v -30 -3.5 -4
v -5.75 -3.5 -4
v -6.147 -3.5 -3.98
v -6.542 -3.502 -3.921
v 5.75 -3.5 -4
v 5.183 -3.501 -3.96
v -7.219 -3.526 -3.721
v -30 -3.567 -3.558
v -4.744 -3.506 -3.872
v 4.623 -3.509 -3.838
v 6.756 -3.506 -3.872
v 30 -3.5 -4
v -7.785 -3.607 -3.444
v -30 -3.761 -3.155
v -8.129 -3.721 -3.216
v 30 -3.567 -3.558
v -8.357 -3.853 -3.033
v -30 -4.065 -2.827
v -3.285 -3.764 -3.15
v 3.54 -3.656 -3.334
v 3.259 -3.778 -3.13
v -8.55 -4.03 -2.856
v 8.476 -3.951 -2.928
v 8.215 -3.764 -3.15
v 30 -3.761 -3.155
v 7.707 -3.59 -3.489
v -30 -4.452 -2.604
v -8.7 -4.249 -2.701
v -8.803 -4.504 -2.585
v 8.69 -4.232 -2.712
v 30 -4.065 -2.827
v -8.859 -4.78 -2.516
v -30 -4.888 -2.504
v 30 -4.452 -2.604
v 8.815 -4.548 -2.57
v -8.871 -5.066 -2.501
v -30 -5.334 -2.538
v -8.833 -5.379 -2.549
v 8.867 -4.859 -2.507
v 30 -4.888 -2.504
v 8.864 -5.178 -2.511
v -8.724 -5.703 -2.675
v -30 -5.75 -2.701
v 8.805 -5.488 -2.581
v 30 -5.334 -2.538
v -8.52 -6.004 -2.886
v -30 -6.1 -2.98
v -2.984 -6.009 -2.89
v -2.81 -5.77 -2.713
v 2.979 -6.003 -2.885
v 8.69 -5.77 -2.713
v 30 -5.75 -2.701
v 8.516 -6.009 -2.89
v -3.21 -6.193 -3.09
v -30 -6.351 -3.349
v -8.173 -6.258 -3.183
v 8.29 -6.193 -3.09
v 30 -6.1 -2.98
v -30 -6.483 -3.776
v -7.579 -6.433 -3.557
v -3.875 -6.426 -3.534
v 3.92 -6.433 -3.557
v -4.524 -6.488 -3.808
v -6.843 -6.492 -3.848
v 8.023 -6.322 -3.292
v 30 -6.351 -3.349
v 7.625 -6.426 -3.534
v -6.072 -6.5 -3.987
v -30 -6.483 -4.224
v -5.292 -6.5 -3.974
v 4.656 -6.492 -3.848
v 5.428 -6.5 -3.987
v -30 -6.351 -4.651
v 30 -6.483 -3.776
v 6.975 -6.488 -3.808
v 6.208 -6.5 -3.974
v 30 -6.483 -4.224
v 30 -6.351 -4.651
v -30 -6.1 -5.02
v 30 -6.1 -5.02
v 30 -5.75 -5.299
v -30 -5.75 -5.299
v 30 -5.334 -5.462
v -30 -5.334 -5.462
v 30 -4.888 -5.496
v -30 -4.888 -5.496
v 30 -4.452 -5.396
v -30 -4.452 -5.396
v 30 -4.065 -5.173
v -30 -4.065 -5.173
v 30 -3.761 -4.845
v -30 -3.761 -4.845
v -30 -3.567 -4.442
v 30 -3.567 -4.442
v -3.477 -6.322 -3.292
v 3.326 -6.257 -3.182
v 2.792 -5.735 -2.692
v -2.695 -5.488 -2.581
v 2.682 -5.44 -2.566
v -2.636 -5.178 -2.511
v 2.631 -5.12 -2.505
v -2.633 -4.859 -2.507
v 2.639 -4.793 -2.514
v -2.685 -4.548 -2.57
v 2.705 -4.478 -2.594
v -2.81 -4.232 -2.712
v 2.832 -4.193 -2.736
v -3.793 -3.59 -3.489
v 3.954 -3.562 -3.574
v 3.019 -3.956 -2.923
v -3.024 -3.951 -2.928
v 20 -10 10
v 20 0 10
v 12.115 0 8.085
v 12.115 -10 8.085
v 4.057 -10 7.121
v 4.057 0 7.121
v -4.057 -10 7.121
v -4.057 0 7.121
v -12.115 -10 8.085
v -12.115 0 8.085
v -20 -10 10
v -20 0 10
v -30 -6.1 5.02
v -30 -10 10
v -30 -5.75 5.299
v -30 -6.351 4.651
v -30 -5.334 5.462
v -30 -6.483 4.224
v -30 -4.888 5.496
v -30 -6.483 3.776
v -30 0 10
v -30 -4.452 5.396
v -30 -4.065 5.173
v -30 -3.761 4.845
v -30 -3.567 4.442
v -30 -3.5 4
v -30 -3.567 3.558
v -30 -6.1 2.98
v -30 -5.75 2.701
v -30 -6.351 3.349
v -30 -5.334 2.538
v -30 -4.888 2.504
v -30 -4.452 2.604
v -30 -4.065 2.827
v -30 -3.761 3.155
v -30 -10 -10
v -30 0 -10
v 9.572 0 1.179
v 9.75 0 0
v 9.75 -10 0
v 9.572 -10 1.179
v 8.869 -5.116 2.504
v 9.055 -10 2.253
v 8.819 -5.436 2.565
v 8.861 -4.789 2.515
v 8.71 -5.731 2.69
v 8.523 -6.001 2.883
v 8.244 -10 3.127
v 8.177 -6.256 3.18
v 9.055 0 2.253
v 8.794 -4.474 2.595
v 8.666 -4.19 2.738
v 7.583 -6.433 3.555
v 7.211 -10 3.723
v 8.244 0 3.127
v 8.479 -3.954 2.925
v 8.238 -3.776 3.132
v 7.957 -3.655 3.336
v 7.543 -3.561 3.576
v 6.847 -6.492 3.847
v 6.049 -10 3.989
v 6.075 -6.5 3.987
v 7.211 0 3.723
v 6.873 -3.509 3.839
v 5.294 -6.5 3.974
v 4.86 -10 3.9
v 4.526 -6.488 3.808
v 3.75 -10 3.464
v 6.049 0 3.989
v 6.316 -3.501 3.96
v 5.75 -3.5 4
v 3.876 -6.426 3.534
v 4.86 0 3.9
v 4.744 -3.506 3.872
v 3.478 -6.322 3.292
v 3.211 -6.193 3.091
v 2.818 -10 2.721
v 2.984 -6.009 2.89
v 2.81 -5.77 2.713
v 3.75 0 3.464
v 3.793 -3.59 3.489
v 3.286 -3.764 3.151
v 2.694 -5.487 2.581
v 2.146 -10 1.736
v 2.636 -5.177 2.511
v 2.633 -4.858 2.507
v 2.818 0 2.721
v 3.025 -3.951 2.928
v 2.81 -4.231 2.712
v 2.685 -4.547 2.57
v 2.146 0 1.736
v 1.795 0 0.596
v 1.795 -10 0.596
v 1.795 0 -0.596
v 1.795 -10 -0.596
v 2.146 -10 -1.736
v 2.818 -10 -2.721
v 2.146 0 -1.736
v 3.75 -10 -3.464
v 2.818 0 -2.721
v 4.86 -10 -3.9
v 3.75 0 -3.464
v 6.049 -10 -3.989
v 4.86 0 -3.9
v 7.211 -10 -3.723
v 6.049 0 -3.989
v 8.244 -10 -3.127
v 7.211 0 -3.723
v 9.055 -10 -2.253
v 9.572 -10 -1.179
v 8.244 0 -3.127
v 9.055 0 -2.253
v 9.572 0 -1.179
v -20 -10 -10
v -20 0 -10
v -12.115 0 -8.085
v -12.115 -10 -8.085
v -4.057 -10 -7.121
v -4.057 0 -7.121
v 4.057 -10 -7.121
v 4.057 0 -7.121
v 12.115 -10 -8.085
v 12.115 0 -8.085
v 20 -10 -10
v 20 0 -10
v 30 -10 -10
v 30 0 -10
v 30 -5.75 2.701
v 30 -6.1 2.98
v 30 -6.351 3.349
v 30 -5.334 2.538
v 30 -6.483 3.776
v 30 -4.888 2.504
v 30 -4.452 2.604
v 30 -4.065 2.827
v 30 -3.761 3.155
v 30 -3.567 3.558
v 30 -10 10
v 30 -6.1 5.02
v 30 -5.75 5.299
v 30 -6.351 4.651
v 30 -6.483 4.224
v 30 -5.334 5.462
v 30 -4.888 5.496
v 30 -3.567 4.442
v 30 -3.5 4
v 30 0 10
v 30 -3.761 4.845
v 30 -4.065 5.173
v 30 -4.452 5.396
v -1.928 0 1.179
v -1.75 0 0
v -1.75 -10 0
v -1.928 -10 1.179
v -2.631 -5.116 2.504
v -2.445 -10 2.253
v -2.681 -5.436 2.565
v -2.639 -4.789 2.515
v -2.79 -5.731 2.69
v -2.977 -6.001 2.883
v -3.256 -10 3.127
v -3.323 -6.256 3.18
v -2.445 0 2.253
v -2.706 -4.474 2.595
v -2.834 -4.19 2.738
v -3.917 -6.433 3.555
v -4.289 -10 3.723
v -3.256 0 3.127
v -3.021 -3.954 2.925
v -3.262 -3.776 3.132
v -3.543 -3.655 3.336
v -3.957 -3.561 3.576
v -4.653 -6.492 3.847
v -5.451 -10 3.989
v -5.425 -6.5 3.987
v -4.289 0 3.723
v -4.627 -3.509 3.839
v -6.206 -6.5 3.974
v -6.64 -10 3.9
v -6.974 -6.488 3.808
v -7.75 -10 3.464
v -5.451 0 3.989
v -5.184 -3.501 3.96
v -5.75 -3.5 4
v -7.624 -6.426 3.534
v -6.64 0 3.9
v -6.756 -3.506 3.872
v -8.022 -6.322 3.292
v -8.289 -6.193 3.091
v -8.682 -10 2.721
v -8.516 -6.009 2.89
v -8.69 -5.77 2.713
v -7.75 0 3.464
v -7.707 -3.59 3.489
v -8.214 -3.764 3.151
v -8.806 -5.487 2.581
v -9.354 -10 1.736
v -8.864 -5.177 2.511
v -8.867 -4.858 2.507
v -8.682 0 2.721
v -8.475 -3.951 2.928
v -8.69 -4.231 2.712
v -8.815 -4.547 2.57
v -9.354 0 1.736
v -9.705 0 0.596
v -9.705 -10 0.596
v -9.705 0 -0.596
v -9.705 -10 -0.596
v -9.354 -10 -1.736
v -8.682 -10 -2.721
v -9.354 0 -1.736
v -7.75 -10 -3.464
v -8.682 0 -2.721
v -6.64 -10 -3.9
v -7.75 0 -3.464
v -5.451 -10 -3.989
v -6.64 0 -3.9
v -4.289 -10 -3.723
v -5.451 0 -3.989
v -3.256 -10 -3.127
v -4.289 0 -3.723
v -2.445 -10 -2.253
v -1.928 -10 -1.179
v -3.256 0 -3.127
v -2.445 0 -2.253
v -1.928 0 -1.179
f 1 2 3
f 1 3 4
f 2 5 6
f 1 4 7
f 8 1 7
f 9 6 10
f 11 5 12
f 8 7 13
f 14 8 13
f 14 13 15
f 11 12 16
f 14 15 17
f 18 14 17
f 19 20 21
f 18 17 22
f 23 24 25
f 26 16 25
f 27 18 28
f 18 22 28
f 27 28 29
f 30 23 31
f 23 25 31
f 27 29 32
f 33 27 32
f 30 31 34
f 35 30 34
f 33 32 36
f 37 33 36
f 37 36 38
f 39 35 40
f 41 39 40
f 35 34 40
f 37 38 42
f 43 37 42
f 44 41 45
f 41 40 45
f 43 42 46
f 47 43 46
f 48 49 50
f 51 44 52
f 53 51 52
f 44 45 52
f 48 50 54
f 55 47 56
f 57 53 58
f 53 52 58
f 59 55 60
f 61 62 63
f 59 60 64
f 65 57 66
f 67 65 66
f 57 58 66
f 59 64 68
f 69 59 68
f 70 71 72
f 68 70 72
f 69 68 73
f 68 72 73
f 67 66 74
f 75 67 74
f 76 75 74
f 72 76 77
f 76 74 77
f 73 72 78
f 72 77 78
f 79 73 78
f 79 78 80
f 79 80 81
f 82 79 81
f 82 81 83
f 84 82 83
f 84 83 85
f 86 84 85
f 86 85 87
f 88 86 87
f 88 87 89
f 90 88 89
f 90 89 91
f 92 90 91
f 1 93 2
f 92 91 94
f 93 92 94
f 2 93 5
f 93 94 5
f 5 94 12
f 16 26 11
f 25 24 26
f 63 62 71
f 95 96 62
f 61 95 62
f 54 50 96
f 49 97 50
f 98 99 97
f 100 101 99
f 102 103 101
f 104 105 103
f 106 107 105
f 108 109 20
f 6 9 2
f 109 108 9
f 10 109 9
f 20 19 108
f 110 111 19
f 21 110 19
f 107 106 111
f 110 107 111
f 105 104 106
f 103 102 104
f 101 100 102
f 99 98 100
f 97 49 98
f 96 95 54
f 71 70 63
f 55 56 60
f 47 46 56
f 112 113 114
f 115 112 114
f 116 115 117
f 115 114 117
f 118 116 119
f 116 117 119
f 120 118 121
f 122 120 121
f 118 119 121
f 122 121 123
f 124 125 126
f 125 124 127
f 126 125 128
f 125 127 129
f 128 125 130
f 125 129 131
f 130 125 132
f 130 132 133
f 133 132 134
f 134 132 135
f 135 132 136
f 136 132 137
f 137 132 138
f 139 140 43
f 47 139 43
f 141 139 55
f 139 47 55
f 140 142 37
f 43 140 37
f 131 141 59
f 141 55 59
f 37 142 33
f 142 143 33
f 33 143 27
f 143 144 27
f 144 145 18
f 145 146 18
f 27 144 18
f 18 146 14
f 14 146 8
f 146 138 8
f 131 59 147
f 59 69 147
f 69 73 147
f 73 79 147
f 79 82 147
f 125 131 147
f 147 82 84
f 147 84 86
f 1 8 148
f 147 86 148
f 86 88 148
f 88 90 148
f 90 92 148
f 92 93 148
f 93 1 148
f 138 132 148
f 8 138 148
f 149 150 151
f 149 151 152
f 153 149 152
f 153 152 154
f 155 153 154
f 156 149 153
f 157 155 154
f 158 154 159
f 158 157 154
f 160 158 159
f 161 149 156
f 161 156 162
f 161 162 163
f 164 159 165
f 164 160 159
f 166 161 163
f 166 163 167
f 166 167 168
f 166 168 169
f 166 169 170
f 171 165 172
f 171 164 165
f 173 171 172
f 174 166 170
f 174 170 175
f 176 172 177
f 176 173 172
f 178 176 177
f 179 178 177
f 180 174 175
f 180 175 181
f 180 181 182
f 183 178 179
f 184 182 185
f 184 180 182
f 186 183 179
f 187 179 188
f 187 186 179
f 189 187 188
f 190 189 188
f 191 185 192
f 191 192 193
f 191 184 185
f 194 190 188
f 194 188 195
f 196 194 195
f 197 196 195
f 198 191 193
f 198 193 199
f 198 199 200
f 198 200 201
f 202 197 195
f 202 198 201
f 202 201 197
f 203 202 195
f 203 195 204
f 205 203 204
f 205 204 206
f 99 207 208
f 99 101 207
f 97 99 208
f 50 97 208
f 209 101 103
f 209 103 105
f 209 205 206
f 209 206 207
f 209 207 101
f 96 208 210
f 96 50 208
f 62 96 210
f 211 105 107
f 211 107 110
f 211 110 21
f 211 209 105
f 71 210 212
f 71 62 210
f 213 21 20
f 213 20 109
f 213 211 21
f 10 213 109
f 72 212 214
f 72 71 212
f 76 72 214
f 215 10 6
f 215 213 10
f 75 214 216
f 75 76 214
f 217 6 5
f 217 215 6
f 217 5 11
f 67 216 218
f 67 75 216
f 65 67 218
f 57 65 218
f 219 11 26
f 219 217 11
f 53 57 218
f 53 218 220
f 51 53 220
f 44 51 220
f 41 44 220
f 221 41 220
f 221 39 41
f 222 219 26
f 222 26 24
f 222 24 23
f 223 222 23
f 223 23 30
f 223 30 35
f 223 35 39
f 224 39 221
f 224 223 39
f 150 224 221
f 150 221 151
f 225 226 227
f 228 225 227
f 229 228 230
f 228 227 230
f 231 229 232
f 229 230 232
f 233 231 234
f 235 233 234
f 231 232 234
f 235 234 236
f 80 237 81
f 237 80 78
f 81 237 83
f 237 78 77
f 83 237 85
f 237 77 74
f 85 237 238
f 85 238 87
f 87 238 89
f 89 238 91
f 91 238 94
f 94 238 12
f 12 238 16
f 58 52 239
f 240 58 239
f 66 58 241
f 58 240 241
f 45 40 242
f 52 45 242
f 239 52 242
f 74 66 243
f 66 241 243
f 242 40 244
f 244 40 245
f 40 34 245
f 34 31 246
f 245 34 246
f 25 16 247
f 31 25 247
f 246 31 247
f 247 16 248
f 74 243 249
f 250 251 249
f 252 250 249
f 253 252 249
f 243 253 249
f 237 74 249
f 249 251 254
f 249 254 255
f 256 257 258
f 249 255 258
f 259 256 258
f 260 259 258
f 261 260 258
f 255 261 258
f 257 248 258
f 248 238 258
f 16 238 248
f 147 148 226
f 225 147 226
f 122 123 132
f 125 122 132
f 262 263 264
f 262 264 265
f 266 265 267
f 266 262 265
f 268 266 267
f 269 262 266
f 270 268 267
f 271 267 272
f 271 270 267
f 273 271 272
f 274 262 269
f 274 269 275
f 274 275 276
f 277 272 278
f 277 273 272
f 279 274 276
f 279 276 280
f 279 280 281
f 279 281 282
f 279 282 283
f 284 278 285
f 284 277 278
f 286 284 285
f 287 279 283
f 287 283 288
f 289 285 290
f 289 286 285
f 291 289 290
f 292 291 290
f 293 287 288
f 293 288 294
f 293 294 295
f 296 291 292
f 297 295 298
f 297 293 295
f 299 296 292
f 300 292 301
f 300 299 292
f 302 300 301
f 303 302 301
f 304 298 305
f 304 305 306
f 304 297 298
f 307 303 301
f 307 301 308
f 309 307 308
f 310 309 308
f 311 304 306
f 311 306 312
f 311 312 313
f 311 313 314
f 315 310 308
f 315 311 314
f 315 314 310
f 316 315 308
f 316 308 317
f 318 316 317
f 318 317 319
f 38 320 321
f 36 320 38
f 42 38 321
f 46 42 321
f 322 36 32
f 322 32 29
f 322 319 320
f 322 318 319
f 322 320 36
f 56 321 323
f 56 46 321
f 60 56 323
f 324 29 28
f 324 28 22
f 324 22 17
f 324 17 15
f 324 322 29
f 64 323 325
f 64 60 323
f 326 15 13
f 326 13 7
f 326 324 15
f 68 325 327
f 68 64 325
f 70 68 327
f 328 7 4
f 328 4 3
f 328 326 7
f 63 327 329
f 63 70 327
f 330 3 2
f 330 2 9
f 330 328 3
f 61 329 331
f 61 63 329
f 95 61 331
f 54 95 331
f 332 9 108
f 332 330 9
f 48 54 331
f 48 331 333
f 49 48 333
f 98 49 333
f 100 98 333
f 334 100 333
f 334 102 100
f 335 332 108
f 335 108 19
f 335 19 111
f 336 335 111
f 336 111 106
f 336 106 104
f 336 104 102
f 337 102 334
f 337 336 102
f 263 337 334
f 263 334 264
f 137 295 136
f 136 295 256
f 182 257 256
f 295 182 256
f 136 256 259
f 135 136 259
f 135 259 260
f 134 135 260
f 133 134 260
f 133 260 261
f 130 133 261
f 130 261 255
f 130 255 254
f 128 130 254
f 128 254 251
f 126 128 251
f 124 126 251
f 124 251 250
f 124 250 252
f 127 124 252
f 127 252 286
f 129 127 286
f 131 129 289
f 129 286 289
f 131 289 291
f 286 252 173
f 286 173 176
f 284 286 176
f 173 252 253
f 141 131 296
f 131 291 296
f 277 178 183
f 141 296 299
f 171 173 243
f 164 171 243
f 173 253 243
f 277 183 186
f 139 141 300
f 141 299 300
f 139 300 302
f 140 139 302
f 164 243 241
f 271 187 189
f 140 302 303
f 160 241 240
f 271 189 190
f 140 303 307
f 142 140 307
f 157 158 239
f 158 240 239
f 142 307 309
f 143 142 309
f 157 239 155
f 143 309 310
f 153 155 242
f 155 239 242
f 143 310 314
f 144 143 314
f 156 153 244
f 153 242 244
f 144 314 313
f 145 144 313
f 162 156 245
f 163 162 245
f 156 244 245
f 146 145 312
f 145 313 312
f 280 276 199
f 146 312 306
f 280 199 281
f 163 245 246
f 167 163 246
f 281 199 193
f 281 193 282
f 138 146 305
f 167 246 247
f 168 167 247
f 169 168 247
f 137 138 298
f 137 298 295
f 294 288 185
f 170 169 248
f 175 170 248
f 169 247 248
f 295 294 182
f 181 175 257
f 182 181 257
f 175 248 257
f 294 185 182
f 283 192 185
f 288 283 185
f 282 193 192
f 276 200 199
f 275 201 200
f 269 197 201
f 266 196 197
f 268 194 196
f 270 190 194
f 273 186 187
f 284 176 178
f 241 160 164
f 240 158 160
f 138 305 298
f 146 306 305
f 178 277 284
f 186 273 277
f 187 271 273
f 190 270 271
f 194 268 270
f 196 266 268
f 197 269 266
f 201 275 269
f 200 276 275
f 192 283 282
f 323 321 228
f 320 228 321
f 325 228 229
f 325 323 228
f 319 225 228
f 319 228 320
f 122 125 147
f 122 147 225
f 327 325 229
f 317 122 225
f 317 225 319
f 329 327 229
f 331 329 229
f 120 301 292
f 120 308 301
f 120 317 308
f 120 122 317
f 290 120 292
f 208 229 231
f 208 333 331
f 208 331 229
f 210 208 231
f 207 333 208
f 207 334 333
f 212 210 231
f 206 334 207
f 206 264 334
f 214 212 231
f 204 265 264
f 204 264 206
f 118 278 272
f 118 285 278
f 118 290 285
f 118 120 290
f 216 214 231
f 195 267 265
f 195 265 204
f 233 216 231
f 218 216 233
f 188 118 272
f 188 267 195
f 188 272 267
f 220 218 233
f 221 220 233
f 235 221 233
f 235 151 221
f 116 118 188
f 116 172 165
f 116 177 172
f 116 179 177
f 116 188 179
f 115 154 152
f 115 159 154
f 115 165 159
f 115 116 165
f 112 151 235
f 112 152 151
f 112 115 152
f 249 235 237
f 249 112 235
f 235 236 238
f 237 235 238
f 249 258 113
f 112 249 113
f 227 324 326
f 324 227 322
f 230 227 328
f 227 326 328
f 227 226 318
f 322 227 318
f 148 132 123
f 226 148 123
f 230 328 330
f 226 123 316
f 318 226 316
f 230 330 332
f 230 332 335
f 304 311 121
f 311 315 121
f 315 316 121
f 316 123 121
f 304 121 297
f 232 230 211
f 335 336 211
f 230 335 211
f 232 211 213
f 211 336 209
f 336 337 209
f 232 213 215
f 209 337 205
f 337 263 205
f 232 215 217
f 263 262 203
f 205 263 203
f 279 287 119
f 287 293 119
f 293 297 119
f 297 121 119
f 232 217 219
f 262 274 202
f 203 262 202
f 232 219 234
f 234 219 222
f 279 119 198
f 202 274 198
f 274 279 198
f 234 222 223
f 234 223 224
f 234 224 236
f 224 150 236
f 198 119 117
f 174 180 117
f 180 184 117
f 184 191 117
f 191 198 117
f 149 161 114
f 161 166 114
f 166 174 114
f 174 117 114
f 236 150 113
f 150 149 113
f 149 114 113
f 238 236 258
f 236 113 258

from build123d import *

# Parameters (mm, degrees)
F0_R     = 4
F1_DEPTH = 10
F2_R     = 1.5
F3_DEPTH = 60


with BuildPart() as f1:
    # F0 (on Front) → F1 (new body)
    with BuildSketch(Plane.XZ):
        with BuildLine():
            Line((-30, 10), (-30, -10))
            Line((-30, -10), (-20, -10))
            ThreePointArc((-20, -10), (0, -7), (20, -10))
            Line((20, -10), (30, -10))
            Line((30, -10), (30, 10))
            Line((30, 10), (20, 10))
            ThreePointArc((20, 10), (0, 7), (-20, 10))
            Line((-20, 10), (-30, 10))
        make_face()
        with Locations((-5.75, 0)):
            Circle(F0_R, mode=Mode.SUBTRACT)
        with Locations((5.75, 0)):
            Circle(F0_R, mode=Mode.SUBTRACT)
    extrude(amount=F1_DEPTH)

    # F2 (on face) → F3 (cut)
    with BuildSketch(Plane.YZ.offset(30)):
        with Locations((-5, 4)):
            Circle(F2_R)
        with Locations((-5, -4)):
            Circle(F2_R)
    extrude(amount=-F3_DEPTH, mode=Mode.SUBTRACT)


solid = f1.part
